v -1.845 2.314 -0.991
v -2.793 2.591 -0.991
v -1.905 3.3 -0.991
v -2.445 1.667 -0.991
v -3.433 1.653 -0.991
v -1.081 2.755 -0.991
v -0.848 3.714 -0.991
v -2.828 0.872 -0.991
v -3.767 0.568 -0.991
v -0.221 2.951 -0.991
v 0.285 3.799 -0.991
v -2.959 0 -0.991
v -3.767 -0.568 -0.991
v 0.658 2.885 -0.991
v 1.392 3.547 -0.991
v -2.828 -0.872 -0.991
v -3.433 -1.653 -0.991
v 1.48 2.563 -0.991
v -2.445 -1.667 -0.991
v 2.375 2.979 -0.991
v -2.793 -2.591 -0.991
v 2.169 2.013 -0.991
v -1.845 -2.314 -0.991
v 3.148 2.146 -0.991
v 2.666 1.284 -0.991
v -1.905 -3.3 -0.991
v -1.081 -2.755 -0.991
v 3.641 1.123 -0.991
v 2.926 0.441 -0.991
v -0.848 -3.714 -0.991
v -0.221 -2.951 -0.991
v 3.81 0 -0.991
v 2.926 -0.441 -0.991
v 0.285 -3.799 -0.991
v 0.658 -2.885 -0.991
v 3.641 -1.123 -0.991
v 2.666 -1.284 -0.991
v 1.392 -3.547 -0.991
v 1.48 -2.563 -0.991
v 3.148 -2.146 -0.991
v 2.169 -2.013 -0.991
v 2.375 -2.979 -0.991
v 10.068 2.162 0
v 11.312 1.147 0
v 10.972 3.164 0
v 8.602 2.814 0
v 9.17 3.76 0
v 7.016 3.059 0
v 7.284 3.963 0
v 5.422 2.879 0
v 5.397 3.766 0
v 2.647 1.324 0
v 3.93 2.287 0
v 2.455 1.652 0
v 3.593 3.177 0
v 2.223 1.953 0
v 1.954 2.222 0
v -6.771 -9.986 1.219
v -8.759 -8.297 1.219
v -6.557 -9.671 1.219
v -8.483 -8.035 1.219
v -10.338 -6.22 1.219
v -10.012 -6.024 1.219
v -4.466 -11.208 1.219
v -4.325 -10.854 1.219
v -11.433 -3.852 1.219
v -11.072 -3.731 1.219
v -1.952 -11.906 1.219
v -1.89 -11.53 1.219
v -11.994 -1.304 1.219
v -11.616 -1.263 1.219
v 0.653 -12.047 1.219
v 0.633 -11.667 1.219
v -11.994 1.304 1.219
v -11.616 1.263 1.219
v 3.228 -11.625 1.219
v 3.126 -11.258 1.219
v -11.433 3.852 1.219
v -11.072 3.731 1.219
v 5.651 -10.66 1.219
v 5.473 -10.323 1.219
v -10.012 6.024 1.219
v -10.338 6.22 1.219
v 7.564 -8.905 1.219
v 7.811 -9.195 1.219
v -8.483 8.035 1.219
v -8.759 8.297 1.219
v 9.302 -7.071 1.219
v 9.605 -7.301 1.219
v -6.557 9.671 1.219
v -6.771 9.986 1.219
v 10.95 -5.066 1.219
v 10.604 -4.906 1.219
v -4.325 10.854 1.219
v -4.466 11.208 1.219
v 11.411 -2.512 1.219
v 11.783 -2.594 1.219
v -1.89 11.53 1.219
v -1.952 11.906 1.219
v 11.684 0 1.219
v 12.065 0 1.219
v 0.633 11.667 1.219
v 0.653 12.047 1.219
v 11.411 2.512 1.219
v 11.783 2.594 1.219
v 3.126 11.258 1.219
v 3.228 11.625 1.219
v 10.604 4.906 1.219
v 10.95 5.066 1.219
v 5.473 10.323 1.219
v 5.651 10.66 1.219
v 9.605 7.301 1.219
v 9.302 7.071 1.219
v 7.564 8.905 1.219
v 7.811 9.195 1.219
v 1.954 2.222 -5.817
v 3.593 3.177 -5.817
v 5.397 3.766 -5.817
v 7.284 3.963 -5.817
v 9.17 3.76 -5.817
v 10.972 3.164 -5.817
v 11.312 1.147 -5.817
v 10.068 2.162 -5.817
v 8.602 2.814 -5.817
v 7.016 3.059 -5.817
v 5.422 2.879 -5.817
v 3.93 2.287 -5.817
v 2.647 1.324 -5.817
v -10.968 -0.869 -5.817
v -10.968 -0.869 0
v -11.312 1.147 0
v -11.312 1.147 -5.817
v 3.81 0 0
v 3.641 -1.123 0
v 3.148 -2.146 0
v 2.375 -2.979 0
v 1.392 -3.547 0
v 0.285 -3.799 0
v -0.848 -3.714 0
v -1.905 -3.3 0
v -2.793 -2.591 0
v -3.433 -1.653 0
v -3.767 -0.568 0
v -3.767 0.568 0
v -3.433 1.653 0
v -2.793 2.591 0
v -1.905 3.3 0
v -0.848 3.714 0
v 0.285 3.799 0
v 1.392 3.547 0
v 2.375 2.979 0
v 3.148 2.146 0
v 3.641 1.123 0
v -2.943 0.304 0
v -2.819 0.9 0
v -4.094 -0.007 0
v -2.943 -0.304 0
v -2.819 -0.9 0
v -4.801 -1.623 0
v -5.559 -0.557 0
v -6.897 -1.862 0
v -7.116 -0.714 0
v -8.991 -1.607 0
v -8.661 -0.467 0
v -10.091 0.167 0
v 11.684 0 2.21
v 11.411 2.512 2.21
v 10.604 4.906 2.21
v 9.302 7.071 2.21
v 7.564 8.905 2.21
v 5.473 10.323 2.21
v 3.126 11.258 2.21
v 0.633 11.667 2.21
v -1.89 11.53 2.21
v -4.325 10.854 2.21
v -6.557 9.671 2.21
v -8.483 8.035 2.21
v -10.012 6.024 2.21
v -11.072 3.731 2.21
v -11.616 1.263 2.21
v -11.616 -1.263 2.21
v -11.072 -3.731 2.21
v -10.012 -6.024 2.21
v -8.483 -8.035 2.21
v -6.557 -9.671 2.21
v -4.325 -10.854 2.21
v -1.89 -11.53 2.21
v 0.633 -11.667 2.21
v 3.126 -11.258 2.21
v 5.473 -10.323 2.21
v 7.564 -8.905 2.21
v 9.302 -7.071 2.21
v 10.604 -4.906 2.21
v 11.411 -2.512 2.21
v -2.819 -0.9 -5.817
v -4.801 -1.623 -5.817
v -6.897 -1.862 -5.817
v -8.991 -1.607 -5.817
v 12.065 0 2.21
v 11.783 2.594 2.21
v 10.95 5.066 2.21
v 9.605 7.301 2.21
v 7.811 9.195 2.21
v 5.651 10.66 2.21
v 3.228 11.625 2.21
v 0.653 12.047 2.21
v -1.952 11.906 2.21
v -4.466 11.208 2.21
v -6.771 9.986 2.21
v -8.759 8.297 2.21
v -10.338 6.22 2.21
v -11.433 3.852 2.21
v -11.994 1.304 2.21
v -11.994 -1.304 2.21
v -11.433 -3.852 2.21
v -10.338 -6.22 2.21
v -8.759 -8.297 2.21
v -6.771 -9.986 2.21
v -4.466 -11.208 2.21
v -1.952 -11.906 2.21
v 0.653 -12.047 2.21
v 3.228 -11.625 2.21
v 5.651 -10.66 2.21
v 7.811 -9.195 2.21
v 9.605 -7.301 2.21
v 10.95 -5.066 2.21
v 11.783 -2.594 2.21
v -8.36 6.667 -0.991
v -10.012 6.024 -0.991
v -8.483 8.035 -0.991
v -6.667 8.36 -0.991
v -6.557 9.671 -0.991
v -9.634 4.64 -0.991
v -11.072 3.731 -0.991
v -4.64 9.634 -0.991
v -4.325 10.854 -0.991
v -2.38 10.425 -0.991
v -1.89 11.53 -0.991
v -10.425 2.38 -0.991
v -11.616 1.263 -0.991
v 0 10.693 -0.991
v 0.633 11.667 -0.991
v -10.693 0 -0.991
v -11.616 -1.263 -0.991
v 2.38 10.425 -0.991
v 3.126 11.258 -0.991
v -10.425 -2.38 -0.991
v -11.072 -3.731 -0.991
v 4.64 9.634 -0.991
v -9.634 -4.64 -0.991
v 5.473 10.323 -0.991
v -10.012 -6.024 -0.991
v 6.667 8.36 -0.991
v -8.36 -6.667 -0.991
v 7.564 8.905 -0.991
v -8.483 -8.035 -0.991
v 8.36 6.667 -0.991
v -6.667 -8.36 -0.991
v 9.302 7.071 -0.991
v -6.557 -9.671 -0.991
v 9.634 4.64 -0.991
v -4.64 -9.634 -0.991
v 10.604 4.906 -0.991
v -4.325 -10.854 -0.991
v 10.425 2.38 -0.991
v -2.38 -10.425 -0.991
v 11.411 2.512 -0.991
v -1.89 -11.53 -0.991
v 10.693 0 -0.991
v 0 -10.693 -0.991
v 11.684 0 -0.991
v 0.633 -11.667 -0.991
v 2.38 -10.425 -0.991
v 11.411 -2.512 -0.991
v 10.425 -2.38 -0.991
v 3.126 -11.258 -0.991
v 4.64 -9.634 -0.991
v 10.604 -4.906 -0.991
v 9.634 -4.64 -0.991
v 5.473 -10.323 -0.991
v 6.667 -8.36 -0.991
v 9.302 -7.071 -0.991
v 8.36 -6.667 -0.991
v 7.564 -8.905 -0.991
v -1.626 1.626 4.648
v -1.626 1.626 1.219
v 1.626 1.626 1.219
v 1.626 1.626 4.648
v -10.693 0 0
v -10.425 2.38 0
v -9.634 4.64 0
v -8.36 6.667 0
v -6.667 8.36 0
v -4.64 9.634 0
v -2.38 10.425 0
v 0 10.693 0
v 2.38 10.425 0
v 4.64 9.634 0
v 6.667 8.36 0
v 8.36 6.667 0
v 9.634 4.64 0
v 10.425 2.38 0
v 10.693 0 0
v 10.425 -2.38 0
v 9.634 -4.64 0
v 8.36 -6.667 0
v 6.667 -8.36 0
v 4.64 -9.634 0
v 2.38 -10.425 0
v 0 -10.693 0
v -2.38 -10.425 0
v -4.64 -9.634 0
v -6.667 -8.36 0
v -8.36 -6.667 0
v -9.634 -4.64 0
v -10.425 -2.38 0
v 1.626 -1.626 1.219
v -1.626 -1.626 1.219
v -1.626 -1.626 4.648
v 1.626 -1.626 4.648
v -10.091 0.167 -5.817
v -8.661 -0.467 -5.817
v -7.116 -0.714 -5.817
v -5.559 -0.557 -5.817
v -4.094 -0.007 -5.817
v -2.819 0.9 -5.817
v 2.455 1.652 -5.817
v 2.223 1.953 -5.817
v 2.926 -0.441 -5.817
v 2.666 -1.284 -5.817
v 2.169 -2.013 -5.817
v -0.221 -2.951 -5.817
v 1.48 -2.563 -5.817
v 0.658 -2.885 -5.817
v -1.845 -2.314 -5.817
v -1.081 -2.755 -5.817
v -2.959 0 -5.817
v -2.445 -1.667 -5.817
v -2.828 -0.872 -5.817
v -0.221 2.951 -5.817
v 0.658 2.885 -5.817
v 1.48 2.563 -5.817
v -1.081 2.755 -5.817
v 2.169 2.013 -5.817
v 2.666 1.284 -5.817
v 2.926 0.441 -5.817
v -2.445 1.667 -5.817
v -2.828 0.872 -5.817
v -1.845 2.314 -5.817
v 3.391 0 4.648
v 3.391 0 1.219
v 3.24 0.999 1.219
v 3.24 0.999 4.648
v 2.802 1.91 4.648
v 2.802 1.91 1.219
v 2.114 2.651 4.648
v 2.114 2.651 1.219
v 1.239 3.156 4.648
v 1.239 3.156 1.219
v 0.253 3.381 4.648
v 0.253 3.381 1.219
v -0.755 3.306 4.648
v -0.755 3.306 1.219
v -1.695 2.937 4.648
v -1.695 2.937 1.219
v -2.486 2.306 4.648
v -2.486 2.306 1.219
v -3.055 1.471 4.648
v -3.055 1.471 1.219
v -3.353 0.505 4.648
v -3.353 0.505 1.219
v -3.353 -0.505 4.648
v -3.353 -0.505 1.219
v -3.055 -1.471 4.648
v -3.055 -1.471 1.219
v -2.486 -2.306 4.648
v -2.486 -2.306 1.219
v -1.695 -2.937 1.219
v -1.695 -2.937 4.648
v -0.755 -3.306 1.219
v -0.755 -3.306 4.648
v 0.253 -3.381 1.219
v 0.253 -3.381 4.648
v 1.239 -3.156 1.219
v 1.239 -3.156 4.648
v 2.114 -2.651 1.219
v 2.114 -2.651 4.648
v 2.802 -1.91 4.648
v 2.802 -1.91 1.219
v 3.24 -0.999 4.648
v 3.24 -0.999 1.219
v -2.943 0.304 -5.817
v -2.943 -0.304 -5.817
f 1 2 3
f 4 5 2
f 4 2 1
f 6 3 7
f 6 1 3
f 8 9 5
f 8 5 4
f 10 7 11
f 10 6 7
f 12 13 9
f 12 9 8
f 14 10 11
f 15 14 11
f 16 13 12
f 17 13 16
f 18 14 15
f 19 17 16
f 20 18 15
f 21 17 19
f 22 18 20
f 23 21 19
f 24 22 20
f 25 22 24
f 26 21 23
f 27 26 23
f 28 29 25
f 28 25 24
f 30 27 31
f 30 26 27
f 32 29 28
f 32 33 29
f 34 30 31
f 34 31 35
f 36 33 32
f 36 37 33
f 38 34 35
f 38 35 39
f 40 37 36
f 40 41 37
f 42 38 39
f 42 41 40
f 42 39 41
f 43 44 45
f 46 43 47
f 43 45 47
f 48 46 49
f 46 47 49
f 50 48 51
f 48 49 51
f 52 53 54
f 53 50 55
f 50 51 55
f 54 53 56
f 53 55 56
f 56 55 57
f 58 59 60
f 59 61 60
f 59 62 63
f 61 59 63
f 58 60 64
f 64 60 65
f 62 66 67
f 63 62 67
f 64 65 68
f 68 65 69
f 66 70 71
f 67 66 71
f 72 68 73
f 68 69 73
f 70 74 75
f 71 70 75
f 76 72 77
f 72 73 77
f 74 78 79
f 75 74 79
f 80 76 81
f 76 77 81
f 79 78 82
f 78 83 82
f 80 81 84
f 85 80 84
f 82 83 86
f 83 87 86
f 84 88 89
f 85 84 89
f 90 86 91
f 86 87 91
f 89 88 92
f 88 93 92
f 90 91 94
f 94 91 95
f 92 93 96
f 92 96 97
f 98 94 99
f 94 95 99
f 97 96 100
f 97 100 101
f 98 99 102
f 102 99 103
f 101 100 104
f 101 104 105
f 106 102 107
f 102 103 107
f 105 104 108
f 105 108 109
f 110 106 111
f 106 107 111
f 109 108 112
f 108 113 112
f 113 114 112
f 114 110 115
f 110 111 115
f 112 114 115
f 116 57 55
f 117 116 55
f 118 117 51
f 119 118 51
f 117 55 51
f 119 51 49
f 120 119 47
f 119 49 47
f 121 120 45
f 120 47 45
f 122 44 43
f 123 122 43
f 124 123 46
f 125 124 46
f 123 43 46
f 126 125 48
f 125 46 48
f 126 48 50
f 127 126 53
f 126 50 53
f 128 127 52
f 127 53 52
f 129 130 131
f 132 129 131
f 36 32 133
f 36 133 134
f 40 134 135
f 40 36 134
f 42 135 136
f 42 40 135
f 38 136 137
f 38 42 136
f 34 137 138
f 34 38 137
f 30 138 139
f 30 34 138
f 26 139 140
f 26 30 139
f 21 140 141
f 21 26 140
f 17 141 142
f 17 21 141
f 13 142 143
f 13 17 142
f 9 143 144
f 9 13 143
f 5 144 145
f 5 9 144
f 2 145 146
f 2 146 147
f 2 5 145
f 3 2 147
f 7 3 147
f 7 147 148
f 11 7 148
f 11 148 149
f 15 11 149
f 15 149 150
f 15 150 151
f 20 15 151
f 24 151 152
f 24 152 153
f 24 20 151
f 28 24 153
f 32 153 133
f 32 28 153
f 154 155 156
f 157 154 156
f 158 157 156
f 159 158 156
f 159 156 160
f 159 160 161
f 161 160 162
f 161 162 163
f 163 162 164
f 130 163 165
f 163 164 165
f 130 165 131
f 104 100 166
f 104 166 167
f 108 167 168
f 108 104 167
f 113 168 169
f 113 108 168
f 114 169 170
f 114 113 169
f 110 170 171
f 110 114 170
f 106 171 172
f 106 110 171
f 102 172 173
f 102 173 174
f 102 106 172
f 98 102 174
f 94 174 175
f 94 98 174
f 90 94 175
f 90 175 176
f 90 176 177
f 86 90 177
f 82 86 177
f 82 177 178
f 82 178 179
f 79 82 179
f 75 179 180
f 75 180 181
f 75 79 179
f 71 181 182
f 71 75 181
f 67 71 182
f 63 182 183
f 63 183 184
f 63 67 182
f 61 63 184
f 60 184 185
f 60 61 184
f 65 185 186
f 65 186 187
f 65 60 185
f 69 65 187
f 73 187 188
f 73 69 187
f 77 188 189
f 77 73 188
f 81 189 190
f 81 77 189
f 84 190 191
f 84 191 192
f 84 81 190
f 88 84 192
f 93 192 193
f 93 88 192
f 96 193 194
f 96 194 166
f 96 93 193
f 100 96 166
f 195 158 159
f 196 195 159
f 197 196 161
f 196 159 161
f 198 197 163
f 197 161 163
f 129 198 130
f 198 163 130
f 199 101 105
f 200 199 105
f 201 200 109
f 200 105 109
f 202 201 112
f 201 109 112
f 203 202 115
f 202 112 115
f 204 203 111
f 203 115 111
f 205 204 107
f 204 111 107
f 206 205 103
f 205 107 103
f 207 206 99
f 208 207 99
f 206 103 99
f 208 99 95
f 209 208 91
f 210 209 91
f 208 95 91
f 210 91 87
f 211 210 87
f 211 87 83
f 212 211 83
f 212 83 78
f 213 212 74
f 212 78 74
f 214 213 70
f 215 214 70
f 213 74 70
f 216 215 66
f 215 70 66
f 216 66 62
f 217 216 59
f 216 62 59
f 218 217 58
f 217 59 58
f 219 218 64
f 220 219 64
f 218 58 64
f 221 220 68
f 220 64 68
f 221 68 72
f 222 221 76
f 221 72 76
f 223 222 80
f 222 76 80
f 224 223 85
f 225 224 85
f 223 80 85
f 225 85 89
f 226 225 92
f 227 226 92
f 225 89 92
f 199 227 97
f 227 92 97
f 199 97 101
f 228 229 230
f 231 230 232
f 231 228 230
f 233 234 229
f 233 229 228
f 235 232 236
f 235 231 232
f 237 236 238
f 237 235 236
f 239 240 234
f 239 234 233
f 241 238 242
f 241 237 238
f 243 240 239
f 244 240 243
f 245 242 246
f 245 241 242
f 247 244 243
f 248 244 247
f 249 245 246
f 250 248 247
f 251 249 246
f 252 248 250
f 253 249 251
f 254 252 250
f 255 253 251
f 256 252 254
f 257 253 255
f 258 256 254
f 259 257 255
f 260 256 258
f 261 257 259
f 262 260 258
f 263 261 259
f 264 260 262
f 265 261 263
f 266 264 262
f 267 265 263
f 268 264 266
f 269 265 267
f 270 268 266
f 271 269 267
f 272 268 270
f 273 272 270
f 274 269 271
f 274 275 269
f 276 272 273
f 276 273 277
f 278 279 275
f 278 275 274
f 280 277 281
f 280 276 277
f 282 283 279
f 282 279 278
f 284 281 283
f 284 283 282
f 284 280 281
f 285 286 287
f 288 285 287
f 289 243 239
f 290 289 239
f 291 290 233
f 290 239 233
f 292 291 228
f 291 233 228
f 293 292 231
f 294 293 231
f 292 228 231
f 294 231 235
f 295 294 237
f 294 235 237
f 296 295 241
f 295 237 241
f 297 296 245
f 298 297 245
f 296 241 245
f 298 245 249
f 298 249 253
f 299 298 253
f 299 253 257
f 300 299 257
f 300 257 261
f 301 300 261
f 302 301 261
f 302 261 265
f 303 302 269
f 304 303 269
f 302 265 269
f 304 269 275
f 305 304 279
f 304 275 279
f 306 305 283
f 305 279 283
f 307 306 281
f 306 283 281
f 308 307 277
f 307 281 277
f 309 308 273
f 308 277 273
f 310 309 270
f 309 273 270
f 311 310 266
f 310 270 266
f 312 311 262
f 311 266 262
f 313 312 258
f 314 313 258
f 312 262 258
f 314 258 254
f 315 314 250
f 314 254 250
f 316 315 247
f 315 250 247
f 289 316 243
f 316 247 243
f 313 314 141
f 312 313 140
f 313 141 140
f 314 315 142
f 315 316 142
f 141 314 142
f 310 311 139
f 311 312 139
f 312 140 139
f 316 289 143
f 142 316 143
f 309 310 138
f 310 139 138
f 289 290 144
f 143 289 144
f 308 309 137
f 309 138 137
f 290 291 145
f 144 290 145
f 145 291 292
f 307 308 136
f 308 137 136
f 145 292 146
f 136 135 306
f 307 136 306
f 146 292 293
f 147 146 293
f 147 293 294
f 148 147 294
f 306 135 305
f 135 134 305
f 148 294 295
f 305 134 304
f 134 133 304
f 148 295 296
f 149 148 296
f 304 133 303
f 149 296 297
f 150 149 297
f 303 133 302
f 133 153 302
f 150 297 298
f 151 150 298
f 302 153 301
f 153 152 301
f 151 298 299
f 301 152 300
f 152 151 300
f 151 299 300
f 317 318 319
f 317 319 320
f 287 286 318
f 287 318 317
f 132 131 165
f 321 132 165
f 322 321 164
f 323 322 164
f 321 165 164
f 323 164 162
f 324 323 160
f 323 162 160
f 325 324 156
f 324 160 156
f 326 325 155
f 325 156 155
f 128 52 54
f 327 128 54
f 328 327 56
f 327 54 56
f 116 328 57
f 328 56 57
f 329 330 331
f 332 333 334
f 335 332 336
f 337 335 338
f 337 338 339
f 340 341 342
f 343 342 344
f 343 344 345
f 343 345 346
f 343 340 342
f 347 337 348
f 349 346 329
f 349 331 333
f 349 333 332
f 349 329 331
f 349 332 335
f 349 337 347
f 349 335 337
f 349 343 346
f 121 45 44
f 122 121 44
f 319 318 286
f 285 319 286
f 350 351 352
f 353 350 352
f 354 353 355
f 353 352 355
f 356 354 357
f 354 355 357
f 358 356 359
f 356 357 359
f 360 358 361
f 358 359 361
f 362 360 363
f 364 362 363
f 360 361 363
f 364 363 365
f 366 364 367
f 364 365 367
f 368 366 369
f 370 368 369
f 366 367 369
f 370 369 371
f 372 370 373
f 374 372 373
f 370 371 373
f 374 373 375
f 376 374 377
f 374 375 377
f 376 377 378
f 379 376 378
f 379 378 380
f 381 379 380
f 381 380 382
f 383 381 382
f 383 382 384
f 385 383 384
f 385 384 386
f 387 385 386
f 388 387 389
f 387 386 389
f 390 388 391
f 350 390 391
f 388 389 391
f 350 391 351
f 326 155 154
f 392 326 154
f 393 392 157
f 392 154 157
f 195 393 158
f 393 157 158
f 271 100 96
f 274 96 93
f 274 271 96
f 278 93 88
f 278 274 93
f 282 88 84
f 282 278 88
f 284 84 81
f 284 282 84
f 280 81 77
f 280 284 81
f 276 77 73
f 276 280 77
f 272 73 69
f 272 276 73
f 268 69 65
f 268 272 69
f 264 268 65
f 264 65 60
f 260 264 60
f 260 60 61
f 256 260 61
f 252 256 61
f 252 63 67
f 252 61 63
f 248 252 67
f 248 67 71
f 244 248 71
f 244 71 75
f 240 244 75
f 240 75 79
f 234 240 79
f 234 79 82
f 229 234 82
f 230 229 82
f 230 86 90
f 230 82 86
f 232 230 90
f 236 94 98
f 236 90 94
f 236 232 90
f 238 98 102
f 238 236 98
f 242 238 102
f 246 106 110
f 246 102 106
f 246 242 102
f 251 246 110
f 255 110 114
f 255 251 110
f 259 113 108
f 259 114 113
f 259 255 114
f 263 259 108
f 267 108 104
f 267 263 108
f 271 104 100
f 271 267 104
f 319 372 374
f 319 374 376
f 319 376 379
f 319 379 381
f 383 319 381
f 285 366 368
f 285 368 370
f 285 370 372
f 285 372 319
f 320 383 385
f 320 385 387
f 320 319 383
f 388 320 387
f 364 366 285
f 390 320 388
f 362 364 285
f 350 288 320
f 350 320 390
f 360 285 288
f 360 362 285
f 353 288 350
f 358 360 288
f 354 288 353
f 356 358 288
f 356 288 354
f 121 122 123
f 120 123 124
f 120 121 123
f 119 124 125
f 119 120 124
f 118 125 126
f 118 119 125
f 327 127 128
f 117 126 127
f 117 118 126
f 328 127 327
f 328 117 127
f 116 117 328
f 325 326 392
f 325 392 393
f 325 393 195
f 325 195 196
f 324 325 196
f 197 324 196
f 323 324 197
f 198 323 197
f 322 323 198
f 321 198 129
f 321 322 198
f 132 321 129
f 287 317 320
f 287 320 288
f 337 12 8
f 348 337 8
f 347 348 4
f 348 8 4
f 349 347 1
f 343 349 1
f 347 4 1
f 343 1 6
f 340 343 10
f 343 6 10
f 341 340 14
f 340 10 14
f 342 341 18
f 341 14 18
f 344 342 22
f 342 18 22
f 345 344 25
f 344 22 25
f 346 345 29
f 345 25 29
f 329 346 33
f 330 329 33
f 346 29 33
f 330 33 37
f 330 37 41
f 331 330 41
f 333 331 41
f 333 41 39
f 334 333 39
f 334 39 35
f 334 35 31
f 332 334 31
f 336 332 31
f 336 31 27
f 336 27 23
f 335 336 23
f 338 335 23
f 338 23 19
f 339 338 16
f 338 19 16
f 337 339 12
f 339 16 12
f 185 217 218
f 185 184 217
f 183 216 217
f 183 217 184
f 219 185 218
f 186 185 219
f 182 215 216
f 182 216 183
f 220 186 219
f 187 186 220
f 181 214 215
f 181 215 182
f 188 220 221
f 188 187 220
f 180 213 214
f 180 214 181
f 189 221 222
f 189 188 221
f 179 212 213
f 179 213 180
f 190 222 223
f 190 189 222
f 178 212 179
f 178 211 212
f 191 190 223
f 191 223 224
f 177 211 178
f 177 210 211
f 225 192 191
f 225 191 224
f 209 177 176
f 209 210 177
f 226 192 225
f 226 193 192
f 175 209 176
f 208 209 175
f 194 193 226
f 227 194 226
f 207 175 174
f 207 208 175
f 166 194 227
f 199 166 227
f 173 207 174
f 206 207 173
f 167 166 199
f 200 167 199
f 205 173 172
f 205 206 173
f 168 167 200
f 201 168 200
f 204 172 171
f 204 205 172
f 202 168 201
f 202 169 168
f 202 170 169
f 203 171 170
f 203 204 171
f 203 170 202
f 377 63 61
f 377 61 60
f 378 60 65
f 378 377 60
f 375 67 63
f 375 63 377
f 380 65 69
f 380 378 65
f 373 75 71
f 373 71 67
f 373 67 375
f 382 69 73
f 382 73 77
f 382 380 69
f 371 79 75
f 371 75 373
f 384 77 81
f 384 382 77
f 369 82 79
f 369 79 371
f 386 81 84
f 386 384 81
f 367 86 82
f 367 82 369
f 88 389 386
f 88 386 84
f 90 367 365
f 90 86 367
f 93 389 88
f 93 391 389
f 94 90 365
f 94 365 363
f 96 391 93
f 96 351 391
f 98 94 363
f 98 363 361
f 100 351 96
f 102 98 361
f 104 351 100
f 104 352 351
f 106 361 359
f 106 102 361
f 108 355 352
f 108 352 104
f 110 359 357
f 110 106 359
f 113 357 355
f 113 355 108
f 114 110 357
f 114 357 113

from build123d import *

# Parameters (mm, degrees)
SKETCH1_R           = 11.684
BOSS_EXTRUDE1_DEPTH = 1.2192
SKETCH2_R           = 3.3909
SKETCH2_W           = 3.2512
SKETCH2_H           = 3.2512
BOSS_EXTRUDE2_DEPTH = 3.429
SKETCH3_R           = 12.065
SKETCH3_R_2         = 11.684
BOSS_EXTRUDE3_DEPTH = 0.9906
BOSS_EXTRUDE4_START = 0.9906
SKETCH4_R           = 11.684
SKETCH4_R_2         = 10.6934
SKETCH4_R_3         = 3.81
BOSS_EXTRUDE4_DEPTH = 0.9906
SKETCH5_R           = 2.9591
BOSS_EXTRUDE5_DEPTH = 4.826
BOSS_EXTRUDE7_DEPTH = 5.8166


# Read off the part's stored shape, not the designer's step: Boss-Extrude7
with BuildPart() as part:
    # Sketch1 → Boss-Extrude1 (new body)
    with BuildSketch(Plane.XY):
        Circle(SKETCH1_R)
    extrude(amount=BOSS_EXTRUDE1_DEPTH)

    # Sketch2 → Boss-Extrude2 (add)
    with BuildSketch(Plane.XY.offset(1.2192)):
        Circle(SKETCH2_R)
        Rectangle(SKETCH2_W, SKETCH2_H, mode=Mode.SUBTRACT)
    extrude(amount=BOSS_EXTRUDE2_DEPTH)

    # Sketch4 → Boss-Extrude4 (add)
    # profile 1 of 2: a face of its own
    with BuildSketch(Plane(origin=(0, 0, 0), x_dir=(-1, 0, 0), z_dir=(0, 0, -1)).offset(BOSS_EXTRUDE4_START)):
        with Locations(Location((0, 0, 0), (0, 0, 180))):
            Circle(SKETCH4_R)
        Circle(SKETCH4_R_2, mode=Mode.SUBTRACT)
    # profile 2 of 2: a face of its own
    with BuildSketch(Plane(origin=(0, 0, 0), x_dir=(-1, 0, 0), z_dir=(0, 0, -1)).offset(BOSS_EXTRUDE4_START)):
        with Locations(Location((0, 0, 0), (0, 0, 180))):
            Circle(SKETCH4_R_3)
    extrude(amount=-BOSS_EXTRUDE4_DEPTH)

    # Sketch5 → Boss-Extrude5 (add)
    with BuildSketch(Plane(origin=(0, 0, -0.9906), x_dir=(-1, 0, 0), z_dir=(0, 0, -1))):
        Circle(SKETCH5_R)
    extrude(amount=BOSS_EXTRUDE5_DEPTH)


with BuildPart() as body_2:
    # Sketch3 → Boss-Extrude3 (new body)
    with BuildSketch(Plane.XY.offset(1.2192)):
        Circle(SKETCH3_R)
        Circle(SKETCH3_R_2, mode=Mode.SUBTRACT)
    extrude(amount=BOSS_EXTRUDE3_DEPTH)


with BuildPart() as body_3:
    # Boss-Extrude7 outline → Boss-Extrude7 (new body)
    with BuildSketch(Plane(origin=(0, 0, 0), x_dir=(-1, 0, 0), z_dir=(0, 0, -1))):
        with BuildLine():
            ThreePointArc((-1.953753259, 2.222413331), (-6.3351355, 3.914810369), (-10.971663942, 3.164262512))
            Line((-10.971663942, 3.164262512), (-11.311701793, 1.147110303))
            ThreePointArc((-11.311701793, 1.147110303), (-7.016280611, 3.05911682), (-2.646540618, 1.323667469))
            ThreePointArc((-2.646540618, 1.323667469), (-2.343632217, 1.8065605), (-1.953753259, 2.222413331))
        make_face()
        with BuildLine():
            ThreePointArc((11.311701793, 1.147110303), (7.1157256, -0.714132536), (2.818783903, 0.900405531))
            ThreePointArc((2.818783903, 0.900405531), (2.9591, 0), (2.818783903, -0.900405531))
            ThreePointArc((2.818783903, -0.900405531), (6.897015449, -1.862296256), (10.967806427, -0.869387837))
            Line((10.967806427, -0.869387837), (11.311701793, 1.147110303))
        make_face()
    extrude(amount=BOSS_EXTRUDE7_DEPTH)


solid = Compound([part.part, body_2.part, body_3.part])
